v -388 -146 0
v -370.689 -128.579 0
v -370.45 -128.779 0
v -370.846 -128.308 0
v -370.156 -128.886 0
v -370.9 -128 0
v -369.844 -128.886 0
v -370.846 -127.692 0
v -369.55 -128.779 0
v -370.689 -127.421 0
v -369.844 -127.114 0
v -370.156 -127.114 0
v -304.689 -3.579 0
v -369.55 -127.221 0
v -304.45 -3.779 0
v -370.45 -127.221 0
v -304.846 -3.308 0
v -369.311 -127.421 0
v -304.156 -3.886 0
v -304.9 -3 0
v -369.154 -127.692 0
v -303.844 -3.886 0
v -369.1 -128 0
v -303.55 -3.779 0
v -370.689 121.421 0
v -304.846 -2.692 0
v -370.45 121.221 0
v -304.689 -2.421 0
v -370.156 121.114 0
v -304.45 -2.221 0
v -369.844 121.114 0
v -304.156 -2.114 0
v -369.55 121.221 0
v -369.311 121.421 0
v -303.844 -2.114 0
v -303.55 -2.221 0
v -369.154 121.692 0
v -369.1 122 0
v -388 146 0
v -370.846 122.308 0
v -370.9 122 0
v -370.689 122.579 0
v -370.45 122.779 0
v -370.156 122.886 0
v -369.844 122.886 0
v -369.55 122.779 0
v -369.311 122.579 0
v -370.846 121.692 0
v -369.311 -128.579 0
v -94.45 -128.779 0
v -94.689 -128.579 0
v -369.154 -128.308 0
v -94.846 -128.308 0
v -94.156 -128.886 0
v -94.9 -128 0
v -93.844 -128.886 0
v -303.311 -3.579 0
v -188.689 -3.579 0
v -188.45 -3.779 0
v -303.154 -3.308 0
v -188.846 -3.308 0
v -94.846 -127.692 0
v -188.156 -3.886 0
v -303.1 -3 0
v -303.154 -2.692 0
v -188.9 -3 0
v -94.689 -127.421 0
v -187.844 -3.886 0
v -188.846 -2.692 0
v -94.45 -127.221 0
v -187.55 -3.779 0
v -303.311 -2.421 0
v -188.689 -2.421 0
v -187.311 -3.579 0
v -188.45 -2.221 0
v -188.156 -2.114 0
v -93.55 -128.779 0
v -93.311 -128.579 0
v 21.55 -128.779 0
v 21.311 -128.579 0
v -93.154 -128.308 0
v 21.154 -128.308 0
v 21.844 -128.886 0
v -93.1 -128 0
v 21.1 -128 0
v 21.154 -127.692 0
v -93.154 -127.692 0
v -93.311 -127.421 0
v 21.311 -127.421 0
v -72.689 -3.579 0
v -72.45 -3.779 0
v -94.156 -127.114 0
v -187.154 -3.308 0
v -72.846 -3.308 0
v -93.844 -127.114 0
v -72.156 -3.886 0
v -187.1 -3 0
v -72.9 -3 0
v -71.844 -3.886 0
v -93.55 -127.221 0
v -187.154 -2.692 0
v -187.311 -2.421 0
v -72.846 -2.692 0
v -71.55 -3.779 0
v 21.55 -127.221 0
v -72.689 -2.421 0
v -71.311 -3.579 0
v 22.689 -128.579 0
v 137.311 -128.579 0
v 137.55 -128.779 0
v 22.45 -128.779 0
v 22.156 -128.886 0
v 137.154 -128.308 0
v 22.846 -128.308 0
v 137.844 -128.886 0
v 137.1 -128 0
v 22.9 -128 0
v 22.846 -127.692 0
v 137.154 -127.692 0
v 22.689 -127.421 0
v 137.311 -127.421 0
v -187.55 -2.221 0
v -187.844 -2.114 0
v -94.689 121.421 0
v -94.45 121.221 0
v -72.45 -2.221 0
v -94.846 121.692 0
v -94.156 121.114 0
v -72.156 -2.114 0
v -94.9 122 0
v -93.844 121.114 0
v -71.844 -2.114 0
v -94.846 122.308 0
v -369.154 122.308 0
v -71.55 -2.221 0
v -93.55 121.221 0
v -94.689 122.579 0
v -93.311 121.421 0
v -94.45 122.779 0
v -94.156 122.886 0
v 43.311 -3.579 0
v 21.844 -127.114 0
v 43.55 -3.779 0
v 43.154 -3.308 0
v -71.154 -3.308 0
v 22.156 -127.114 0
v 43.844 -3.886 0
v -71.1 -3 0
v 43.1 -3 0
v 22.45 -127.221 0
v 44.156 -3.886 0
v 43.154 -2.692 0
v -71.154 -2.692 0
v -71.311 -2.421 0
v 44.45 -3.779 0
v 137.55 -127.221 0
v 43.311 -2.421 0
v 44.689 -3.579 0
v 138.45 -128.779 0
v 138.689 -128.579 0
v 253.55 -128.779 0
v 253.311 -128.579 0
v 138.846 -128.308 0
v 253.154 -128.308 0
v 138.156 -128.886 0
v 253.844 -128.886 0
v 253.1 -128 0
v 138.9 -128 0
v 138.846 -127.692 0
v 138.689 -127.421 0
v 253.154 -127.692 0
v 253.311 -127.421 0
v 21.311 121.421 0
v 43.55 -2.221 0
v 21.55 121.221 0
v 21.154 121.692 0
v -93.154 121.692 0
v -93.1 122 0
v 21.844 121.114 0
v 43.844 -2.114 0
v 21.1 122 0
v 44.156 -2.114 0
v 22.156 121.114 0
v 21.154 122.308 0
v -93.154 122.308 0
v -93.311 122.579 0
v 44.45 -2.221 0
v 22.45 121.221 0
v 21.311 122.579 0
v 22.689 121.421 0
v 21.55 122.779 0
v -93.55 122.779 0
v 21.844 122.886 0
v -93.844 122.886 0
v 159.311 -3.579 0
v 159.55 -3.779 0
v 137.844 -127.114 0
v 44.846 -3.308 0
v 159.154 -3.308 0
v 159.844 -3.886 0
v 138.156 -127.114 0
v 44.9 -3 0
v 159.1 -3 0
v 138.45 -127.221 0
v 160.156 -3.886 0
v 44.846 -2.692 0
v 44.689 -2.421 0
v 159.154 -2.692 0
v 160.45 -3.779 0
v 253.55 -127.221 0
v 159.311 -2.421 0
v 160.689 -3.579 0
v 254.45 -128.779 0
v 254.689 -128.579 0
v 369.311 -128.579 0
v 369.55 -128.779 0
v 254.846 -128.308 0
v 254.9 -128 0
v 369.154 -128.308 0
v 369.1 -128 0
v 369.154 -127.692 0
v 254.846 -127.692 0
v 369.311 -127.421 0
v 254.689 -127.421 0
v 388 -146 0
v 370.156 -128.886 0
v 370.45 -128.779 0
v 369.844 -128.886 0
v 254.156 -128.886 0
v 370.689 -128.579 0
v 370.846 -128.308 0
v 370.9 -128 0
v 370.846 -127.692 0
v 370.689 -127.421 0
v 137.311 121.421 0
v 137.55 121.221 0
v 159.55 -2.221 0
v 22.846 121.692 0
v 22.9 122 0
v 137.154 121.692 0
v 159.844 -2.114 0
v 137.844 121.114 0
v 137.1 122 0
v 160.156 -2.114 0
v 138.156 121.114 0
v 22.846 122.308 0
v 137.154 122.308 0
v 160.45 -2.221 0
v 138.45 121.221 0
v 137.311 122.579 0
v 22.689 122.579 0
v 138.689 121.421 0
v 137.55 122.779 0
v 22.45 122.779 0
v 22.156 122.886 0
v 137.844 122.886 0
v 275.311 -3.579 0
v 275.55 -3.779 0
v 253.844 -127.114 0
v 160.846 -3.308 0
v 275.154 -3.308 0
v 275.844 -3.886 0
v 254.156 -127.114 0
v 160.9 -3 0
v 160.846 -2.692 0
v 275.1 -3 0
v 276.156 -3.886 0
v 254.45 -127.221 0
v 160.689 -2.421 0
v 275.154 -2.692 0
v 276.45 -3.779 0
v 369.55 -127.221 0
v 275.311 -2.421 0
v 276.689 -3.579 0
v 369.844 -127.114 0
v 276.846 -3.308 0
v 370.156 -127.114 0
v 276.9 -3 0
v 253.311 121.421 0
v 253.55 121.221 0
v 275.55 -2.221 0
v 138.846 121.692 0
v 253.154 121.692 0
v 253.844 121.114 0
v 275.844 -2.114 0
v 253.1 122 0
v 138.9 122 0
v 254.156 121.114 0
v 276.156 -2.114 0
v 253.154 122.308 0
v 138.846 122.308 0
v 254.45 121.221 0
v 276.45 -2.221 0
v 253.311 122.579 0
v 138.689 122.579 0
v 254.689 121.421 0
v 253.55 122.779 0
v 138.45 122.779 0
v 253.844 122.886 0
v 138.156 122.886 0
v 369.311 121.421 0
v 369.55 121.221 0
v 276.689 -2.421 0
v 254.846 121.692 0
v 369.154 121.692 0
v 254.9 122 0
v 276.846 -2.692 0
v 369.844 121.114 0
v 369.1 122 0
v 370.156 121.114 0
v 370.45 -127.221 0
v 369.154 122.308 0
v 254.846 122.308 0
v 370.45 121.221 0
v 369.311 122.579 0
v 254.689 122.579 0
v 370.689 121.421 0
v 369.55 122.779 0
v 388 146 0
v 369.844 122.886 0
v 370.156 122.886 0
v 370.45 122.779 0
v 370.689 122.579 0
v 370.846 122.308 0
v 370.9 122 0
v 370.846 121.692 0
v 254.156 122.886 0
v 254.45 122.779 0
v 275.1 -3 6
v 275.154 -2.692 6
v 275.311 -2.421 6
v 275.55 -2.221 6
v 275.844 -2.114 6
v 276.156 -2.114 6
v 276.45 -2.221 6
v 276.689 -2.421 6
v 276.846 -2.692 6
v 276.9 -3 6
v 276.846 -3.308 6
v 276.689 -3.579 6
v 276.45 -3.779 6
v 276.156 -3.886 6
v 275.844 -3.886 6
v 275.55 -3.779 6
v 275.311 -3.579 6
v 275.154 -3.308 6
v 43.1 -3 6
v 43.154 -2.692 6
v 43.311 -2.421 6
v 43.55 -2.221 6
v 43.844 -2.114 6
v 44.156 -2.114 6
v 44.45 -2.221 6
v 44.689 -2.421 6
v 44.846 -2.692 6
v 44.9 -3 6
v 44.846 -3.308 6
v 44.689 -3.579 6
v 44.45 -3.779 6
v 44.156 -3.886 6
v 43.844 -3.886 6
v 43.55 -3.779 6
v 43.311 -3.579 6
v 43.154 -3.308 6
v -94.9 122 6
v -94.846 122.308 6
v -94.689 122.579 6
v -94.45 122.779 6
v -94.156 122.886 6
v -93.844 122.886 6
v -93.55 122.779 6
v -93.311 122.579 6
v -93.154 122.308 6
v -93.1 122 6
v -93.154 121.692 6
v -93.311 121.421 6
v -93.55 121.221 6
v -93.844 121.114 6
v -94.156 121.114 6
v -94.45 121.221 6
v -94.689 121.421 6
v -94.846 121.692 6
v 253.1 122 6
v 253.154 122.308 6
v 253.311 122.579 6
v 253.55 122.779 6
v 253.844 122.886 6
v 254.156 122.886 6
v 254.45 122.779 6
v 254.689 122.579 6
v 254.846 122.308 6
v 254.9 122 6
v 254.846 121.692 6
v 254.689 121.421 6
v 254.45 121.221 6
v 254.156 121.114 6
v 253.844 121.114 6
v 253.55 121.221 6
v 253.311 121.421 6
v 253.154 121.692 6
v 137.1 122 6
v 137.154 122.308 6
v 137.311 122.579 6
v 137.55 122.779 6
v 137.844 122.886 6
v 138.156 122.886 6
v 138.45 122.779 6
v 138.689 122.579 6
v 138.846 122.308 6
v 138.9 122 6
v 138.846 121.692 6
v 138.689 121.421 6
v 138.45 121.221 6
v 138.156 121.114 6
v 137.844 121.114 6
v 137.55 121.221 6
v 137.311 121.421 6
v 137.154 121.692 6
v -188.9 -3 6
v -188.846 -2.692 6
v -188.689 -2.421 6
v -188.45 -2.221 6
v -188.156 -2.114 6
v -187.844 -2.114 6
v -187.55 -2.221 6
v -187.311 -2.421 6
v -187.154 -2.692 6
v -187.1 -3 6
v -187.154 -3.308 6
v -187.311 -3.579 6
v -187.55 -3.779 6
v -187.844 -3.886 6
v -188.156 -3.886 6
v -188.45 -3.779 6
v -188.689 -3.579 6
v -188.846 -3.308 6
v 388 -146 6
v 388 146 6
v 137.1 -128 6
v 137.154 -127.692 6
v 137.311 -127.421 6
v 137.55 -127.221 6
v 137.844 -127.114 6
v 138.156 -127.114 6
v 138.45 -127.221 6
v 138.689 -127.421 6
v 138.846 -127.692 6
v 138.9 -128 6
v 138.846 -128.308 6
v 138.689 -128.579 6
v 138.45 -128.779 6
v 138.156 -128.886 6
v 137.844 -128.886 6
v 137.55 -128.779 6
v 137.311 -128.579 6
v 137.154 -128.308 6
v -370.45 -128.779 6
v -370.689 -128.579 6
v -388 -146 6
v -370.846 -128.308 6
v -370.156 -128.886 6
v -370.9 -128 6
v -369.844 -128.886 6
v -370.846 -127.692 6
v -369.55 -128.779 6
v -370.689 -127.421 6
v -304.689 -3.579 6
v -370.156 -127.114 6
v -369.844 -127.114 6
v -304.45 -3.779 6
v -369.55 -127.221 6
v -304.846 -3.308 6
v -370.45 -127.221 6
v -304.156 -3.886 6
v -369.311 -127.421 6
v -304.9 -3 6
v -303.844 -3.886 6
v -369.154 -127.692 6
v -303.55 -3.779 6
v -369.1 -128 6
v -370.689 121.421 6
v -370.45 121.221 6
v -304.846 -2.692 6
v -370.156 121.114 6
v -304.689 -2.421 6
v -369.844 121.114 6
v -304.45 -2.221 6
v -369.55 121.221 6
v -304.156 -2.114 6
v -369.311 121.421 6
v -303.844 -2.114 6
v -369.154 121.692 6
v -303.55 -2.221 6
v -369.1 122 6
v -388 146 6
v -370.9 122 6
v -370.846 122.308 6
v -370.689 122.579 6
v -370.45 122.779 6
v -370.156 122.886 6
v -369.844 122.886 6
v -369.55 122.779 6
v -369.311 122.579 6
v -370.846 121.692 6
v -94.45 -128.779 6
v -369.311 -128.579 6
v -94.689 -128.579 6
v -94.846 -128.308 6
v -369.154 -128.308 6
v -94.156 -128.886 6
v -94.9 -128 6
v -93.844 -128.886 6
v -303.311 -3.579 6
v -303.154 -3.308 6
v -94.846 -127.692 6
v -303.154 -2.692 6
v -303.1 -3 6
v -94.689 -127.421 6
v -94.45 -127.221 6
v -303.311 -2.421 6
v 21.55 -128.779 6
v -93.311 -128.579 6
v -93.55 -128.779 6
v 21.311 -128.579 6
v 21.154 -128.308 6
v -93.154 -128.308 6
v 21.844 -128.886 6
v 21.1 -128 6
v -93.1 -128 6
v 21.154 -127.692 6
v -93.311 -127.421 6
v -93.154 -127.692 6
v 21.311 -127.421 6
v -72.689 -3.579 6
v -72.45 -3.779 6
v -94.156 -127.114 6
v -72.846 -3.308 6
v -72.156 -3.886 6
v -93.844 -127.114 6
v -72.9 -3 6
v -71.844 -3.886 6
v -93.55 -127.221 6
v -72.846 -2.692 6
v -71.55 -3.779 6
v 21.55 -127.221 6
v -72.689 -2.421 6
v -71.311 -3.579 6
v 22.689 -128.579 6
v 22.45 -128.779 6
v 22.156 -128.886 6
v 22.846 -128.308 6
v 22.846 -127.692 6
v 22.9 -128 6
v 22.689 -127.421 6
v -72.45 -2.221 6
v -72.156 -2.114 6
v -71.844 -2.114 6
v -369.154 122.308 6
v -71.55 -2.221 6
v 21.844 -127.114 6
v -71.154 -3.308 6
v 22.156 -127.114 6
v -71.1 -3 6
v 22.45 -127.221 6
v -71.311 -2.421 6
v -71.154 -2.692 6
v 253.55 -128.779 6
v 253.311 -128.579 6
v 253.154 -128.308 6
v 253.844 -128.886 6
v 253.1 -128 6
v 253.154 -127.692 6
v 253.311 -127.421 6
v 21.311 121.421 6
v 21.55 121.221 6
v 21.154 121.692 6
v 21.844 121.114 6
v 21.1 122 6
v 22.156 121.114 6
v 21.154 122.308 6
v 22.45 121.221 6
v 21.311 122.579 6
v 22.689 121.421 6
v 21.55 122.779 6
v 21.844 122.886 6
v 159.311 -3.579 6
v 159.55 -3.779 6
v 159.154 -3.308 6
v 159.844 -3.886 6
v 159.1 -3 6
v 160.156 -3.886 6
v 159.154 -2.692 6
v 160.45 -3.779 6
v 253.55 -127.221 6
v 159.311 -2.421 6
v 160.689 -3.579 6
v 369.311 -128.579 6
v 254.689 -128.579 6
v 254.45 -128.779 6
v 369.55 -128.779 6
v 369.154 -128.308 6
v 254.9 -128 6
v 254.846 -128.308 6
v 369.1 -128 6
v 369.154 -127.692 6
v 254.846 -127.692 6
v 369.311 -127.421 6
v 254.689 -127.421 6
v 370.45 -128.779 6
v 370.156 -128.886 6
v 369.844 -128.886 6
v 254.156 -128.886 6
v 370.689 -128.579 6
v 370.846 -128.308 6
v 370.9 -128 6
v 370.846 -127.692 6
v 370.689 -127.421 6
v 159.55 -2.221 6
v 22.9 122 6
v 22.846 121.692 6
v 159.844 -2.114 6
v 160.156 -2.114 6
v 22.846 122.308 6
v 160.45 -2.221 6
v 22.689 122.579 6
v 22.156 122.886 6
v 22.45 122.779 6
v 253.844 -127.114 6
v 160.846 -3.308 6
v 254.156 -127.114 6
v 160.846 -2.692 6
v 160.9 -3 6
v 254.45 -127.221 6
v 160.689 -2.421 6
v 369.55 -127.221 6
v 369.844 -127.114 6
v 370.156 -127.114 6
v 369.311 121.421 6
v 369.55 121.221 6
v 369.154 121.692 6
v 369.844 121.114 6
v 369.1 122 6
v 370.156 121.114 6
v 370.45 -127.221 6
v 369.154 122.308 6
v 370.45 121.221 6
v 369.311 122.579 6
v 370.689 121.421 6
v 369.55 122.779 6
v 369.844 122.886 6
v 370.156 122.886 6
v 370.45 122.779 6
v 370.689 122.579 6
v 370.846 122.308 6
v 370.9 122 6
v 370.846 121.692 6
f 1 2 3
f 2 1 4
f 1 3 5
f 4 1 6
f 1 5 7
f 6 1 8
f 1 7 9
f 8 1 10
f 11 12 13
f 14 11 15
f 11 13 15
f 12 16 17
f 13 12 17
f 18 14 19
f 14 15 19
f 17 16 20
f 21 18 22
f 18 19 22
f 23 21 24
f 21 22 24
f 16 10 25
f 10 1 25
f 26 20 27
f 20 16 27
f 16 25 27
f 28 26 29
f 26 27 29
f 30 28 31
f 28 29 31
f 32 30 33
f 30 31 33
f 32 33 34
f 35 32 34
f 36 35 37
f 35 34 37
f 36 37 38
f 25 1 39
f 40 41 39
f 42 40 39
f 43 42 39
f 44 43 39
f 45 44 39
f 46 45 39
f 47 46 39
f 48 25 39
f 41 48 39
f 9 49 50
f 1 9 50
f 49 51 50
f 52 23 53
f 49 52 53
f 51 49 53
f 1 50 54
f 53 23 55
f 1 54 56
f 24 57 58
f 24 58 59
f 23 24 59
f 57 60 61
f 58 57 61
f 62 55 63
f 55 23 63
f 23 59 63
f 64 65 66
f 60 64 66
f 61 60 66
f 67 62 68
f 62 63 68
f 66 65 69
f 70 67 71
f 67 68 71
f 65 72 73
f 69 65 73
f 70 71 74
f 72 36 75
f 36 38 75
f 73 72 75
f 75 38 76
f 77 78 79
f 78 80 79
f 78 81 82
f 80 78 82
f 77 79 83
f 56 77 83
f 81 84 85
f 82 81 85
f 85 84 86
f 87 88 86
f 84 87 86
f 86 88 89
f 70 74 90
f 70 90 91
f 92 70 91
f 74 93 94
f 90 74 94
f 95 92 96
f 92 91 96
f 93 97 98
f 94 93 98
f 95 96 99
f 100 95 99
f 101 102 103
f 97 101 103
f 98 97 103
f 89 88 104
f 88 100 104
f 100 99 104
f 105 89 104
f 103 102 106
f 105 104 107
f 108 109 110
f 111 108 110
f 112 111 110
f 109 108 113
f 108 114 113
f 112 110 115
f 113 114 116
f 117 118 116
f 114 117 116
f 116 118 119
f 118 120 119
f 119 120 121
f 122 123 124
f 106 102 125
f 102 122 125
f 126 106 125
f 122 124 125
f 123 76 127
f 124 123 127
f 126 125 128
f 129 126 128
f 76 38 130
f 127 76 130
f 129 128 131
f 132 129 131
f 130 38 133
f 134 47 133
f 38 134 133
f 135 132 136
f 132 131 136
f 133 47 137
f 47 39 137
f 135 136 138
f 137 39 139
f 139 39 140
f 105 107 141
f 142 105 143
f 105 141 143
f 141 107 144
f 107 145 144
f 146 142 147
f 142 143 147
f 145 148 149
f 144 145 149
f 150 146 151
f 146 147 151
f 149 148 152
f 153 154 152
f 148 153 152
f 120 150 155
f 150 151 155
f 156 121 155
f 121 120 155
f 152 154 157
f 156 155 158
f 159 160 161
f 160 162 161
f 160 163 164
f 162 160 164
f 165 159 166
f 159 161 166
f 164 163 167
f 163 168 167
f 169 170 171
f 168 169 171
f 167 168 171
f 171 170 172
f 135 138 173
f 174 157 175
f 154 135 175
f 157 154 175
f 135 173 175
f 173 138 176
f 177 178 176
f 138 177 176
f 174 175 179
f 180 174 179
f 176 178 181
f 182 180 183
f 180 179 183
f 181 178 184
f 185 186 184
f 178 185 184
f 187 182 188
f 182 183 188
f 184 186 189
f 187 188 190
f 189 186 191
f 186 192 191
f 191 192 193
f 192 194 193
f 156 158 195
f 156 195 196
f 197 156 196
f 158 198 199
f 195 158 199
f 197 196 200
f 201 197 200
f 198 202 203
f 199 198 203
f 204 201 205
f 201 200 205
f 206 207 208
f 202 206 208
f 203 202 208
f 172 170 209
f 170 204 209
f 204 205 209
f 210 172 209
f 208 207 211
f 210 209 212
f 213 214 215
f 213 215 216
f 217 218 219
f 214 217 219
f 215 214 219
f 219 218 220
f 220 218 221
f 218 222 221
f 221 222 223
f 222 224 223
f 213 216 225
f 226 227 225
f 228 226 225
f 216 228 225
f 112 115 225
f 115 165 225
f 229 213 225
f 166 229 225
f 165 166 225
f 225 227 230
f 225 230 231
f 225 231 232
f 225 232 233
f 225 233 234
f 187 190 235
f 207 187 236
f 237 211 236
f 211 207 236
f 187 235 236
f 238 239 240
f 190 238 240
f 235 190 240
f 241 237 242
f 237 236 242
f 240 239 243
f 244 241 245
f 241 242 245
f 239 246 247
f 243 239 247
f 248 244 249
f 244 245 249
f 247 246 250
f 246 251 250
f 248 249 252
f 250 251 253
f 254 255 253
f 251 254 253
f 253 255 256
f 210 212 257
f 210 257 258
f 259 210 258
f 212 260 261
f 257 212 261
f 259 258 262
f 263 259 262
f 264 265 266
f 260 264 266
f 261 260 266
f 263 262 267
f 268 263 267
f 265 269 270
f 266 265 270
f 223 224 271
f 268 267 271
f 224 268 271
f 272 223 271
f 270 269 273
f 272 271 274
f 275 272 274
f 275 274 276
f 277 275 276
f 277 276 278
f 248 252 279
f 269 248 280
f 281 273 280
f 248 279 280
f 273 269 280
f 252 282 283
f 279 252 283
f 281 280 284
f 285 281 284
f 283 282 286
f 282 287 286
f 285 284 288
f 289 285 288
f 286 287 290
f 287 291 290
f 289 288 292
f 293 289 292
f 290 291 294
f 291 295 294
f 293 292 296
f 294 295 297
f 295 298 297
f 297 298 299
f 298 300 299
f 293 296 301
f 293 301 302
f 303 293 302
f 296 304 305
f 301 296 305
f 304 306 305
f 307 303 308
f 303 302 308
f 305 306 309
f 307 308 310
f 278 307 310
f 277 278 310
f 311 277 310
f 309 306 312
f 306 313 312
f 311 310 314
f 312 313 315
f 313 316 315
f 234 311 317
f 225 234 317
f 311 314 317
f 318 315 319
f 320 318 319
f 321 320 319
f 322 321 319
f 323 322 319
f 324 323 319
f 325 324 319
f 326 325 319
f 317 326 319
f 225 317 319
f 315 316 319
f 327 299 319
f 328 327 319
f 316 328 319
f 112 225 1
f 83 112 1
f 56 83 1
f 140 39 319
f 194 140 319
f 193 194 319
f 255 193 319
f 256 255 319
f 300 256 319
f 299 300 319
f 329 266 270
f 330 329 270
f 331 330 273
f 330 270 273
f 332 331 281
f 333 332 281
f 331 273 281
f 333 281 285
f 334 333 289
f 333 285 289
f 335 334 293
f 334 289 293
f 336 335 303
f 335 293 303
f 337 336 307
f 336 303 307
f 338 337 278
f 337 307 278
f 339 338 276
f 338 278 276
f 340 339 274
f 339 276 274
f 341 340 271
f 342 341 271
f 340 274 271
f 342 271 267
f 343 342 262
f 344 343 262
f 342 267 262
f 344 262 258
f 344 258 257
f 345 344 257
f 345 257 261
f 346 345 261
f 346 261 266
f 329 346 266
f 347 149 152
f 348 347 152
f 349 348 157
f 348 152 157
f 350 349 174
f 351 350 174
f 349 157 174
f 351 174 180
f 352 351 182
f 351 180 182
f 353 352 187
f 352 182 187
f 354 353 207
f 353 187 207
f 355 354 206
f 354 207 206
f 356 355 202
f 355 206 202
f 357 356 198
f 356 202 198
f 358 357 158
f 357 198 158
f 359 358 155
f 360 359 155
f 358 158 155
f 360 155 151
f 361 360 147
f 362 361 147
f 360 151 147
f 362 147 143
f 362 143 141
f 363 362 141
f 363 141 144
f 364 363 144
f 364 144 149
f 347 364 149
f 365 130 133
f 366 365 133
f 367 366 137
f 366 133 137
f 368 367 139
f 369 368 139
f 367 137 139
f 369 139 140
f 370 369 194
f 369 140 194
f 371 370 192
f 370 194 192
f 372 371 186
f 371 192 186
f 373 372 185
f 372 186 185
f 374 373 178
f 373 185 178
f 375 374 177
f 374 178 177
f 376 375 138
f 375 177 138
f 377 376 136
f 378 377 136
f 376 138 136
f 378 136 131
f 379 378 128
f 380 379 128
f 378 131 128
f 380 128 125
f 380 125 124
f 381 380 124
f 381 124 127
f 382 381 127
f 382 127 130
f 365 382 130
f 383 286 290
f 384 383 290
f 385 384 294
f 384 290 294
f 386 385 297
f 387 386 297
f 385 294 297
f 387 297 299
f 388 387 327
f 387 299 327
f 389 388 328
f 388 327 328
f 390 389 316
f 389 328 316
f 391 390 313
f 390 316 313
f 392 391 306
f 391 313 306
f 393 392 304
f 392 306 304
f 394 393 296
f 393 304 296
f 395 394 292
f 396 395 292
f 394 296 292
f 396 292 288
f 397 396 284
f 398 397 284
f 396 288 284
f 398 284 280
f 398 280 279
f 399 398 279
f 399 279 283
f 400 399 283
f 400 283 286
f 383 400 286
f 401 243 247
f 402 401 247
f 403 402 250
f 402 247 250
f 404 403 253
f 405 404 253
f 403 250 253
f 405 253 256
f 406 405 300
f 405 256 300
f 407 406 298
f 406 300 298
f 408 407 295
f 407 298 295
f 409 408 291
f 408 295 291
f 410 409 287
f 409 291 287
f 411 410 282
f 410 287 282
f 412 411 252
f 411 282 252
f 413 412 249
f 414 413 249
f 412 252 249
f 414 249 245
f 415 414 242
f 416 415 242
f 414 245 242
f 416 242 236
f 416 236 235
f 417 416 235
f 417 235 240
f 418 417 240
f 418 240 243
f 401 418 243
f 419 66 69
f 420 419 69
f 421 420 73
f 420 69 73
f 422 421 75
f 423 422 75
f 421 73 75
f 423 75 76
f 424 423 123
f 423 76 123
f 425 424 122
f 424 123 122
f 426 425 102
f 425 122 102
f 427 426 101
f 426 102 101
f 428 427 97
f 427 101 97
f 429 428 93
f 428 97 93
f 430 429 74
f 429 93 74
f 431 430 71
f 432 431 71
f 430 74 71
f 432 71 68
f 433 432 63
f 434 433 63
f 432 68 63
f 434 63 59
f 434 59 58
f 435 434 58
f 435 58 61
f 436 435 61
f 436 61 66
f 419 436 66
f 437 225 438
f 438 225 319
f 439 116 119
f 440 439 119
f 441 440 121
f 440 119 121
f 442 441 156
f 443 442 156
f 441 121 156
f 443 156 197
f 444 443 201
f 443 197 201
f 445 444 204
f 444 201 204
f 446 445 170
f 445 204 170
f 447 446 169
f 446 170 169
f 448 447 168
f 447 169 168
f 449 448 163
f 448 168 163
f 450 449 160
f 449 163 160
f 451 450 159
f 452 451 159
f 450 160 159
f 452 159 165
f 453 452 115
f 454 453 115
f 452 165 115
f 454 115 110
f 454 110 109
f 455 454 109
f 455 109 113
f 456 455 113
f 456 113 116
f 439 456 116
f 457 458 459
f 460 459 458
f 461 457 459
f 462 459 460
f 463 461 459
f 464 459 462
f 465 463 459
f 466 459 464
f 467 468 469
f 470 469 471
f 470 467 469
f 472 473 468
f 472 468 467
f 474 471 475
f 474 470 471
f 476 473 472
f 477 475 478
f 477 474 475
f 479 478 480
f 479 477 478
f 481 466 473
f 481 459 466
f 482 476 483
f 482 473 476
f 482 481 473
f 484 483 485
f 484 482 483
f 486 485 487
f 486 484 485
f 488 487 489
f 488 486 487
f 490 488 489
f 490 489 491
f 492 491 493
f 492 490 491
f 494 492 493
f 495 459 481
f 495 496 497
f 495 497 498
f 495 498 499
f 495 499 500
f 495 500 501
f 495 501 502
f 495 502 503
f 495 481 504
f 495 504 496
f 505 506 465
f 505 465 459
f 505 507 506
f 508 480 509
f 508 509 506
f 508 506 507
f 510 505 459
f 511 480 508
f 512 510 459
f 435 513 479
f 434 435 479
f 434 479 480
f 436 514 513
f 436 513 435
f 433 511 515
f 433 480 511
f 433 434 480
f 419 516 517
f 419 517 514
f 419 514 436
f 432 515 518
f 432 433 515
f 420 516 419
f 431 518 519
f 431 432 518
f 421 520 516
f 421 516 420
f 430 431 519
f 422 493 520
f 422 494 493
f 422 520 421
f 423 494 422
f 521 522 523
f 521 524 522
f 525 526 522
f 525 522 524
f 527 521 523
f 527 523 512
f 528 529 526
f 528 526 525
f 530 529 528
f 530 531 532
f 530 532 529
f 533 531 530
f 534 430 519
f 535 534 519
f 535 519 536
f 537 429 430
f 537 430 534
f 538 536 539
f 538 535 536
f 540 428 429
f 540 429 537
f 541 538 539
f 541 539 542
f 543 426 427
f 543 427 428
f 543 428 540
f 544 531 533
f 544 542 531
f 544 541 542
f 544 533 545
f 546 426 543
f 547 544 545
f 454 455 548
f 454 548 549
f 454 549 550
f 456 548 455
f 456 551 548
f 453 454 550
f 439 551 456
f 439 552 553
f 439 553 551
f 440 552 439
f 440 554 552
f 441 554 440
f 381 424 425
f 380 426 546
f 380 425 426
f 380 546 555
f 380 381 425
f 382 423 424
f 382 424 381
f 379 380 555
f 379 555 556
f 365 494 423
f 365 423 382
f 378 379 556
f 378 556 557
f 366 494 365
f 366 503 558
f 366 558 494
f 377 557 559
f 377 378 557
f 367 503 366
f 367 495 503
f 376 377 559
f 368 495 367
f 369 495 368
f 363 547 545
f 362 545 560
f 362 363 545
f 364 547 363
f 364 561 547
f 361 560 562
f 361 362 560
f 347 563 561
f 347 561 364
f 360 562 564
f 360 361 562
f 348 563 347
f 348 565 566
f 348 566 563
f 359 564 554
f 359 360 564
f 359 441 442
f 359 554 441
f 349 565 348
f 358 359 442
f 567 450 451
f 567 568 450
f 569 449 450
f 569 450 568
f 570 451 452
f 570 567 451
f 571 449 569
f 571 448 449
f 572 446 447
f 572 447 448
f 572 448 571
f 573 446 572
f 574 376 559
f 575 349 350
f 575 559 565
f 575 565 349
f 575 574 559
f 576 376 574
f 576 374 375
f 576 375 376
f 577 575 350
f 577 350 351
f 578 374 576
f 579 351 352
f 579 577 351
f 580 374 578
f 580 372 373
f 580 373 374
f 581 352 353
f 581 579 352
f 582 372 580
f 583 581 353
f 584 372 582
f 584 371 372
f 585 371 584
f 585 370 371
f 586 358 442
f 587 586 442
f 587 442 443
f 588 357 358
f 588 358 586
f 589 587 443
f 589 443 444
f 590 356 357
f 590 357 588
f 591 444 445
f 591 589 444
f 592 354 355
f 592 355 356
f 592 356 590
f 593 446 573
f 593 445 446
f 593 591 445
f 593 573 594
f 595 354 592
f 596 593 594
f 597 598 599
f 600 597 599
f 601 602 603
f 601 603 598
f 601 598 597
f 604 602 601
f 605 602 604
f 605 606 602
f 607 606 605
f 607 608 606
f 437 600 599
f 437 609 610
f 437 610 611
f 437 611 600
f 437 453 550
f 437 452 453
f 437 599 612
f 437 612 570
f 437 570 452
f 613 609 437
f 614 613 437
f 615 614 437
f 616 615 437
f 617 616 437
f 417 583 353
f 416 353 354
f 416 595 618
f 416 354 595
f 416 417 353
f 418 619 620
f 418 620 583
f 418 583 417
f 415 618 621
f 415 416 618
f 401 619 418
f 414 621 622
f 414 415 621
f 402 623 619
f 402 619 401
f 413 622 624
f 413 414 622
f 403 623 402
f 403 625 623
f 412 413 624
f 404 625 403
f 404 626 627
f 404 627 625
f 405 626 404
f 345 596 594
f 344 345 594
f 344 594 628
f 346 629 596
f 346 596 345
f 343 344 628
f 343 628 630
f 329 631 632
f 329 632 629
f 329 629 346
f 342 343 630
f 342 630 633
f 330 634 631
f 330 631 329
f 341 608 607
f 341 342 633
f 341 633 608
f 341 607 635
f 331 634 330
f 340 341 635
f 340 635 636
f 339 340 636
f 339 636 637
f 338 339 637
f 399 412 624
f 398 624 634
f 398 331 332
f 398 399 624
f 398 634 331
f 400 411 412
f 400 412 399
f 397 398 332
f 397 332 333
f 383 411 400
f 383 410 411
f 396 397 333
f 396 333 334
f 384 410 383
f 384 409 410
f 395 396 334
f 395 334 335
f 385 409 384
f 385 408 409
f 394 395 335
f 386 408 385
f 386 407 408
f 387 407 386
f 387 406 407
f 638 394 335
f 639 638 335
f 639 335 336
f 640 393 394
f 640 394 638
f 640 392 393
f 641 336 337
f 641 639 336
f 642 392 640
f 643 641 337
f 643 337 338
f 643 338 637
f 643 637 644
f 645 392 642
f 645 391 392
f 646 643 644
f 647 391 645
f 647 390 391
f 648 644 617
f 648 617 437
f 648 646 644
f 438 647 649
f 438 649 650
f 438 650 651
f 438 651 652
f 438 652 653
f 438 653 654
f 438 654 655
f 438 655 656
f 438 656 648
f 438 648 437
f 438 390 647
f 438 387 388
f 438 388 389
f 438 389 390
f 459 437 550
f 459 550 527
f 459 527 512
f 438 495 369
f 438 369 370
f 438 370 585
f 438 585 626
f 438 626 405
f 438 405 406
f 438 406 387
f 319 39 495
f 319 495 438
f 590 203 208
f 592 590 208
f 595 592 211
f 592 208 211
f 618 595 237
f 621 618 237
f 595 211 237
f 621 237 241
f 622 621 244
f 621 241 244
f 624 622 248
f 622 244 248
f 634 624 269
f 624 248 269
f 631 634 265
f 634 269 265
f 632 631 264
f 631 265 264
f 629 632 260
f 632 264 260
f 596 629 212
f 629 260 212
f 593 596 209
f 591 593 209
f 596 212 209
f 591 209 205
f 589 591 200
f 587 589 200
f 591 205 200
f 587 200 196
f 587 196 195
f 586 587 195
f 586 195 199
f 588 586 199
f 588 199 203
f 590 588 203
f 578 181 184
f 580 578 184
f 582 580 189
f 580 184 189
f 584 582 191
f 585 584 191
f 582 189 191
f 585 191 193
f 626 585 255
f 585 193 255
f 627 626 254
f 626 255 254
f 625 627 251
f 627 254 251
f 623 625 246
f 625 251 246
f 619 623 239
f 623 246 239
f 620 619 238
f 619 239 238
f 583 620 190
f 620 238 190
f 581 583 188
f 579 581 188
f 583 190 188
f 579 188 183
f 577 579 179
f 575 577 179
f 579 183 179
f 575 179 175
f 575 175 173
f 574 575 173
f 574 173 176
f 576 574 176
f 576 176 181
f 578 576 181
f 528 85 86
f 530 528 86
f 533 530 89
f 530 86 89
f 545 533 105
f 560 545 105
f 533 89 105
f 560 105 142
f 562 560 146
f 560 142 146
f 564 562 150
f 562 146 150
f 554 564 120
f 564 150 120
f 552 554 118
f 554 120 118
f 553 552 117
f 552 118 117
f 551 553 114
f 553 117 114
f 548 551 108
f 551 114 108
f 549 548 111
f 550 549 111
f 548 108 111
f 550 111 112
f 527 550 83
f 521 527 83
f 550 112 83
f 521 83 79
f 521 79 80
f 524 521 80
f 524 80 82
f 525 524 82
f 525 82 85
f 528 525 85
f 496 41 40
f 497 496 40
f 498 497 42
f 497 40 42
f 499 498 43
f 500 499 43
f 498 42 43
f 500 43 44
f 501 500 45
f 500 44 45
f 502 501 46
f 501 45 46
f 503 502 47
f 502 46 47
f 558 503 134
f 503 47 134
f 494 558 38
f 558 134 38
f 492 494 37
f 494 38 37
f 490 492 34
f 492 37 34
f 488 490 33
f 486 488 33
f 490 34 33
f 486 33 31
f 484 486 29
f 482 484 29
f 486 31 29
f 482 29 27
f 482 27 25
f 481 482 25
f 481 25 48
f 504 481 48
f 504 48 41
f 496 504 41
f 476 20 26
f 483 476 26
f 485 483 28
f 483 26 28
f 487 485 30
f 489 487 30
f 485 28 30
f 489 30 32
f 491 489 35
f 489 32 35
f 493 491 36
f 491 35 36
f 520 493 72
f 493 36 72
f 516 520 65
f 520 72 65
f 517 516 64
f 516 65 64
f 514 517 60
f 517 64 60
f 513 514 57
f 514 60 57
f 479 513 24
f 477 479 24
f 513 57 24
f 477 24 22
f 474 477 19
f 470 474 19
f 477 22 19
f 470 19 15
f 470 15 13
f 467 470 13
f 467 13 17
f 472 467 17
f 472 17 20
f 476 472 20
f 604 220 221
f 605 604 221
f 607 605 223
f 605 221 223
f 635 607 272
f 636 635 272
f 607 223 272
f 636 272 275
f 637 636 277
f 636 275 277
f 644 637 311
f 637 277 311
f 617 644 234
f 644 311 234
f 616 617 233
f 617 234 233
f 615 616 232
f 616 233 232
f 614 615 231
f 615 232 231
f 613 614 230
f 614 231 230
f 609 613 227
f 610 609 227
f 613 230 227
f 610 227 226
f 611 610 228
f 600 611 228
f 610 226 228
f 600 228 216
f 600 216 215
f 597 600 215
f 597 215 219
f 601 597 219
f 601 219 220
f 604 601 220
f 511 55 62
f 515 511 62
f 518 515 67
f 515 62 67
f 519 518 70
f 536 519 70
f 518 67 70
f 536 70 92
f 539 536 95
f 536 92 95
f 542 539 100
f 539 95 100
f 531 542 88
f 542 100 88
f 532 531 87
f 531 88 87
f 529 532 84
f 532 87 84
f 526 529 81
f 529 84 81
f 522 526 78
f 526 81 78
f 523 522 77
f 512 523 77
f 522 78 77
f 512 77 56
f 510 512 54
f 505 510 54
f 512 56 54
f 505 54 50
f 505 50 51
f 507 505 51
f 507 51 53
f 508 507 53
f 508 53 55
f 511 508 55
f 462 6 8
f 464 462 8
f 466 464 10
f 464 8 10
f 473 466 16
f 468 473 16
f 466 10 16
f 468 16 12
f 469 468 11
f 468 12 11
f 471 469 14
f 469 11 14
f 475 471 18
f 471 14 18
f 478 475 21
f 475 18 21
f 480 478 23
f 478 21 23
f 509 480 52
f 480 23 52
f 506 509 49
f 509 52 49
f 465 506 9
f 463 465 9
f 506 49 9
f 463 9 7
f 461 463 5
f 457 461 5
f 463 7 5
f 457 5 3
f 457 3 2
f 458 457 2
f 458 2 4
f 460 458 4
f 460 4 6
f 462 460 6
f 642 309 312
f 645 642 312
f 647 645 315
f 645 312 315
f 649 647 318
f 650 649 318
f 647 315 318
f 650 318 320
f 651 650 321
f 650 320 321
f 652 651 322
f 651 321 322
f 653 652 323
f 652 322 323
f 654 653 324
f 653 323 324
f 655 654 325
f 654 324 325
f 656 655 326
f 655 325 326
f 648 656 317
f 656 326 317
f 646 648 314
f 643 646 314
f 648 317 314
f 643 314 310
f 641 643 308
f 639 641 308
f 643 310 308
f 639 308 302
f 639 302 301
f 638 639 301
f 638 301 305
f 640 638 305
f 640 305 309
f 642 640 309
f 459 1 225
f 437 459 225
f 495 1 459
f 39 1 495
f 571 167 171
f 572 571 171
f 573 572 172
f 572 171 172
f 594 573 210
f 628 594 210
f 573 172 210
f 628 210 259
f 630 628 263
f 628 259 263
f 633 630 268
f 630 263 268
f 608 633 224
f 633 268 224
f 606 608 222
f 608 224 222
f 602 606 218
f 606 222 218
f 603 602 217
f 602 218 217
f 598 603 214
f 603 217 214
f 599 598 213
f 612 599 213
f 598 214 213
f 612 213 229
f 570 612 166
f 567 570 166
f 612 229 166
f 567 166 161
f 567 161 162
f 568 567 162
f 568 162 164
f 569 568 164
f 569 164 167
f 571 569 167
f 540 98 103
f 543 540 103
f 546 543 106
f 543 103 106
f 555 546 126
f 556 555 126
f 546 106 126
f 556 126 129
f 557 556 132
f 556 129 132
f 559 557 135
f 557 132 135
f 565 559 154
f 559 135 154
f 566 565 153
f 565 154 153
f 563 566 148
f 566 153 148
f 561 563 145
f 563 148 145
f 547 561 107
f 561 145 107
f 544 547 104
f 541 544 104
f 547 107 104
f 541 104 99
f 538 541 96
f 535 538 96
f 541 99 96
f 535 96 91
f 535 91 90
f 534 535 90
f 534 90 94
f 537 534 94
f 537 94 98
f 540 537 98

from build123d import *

# Parameters (mm, degrees)
SKETCH1_W           = 776
SKETCH1_H           = 292
BOSS_EXTRUDE1_DEPTH = 6
SKETCH2_R           = 0.9
CUT_EXTRUDE1_DEPTH  = 6


with BuildPart() as part:
    # Sketch1 → Boss-Extrude1 (new body)
    with BuildSketch(Plane.XY):
        Rectangle(SKETCH1_W, SKETCH1_H)
    extrude(amount=BOSS_EXTRUDE1_DEPTH)

    # Sketch2 → Cut-Extrude1 (cut)
    with BuildSketch(Plane(origin=(0, 0, 0), x_dir=(-1, 0, 0), z_dir=(0, 0, -1))):
        with Locations((-370, -128)):
            Circle(SKETCH2_R)
        with Locations((-370, 122)):
            Circle(SKETCH2_R)
        with Locations((370, -128)):
            Circle(SKETCH2_R)
        with Locations((370, 122)):
            Circle(SKETCH2_R)
        with Locations((-276, -3)):
            Circle(SKETCH2_R)
        with Locations((-254, -128)):
            Circle(SKETCH2_R)
        with Locations((-254, 122)):
            Circle(SKETCH2_R)
        with Locations((-160, -3)):
            Circle(SKETCH2_R)
        with Locations((-138, -128)):
            Circle(SKETCH2_R)
        with Locations((-138, 122)):
            Circle(SKETCH2_R)
        with Locations((-44, -3)):
            Circle(SKETCH2_R)
        with Locations((-22, -128)):
            Circle(SKETCH2_R)
        with Locations((-22, 122)):
            Circle(SKETCH2_R)
        with Locations((72, -3)):
            Circle(SKETCH2_R)
        with Locations((94, -128)):
            Circle(SKETCH2_R)
        with Locations((94, 122)):
            Circle(SKETCH2_R)
        with Locations((188, -3)):
            Circle(SKETCH2_R)
        with Locations((304, -3)):
            Circle(SKETCH2_R)
    extrude(amount=-CUT_EXTRUDE1_DEPTH, mode=Mode.SUBTRACT)


solid = part.part
